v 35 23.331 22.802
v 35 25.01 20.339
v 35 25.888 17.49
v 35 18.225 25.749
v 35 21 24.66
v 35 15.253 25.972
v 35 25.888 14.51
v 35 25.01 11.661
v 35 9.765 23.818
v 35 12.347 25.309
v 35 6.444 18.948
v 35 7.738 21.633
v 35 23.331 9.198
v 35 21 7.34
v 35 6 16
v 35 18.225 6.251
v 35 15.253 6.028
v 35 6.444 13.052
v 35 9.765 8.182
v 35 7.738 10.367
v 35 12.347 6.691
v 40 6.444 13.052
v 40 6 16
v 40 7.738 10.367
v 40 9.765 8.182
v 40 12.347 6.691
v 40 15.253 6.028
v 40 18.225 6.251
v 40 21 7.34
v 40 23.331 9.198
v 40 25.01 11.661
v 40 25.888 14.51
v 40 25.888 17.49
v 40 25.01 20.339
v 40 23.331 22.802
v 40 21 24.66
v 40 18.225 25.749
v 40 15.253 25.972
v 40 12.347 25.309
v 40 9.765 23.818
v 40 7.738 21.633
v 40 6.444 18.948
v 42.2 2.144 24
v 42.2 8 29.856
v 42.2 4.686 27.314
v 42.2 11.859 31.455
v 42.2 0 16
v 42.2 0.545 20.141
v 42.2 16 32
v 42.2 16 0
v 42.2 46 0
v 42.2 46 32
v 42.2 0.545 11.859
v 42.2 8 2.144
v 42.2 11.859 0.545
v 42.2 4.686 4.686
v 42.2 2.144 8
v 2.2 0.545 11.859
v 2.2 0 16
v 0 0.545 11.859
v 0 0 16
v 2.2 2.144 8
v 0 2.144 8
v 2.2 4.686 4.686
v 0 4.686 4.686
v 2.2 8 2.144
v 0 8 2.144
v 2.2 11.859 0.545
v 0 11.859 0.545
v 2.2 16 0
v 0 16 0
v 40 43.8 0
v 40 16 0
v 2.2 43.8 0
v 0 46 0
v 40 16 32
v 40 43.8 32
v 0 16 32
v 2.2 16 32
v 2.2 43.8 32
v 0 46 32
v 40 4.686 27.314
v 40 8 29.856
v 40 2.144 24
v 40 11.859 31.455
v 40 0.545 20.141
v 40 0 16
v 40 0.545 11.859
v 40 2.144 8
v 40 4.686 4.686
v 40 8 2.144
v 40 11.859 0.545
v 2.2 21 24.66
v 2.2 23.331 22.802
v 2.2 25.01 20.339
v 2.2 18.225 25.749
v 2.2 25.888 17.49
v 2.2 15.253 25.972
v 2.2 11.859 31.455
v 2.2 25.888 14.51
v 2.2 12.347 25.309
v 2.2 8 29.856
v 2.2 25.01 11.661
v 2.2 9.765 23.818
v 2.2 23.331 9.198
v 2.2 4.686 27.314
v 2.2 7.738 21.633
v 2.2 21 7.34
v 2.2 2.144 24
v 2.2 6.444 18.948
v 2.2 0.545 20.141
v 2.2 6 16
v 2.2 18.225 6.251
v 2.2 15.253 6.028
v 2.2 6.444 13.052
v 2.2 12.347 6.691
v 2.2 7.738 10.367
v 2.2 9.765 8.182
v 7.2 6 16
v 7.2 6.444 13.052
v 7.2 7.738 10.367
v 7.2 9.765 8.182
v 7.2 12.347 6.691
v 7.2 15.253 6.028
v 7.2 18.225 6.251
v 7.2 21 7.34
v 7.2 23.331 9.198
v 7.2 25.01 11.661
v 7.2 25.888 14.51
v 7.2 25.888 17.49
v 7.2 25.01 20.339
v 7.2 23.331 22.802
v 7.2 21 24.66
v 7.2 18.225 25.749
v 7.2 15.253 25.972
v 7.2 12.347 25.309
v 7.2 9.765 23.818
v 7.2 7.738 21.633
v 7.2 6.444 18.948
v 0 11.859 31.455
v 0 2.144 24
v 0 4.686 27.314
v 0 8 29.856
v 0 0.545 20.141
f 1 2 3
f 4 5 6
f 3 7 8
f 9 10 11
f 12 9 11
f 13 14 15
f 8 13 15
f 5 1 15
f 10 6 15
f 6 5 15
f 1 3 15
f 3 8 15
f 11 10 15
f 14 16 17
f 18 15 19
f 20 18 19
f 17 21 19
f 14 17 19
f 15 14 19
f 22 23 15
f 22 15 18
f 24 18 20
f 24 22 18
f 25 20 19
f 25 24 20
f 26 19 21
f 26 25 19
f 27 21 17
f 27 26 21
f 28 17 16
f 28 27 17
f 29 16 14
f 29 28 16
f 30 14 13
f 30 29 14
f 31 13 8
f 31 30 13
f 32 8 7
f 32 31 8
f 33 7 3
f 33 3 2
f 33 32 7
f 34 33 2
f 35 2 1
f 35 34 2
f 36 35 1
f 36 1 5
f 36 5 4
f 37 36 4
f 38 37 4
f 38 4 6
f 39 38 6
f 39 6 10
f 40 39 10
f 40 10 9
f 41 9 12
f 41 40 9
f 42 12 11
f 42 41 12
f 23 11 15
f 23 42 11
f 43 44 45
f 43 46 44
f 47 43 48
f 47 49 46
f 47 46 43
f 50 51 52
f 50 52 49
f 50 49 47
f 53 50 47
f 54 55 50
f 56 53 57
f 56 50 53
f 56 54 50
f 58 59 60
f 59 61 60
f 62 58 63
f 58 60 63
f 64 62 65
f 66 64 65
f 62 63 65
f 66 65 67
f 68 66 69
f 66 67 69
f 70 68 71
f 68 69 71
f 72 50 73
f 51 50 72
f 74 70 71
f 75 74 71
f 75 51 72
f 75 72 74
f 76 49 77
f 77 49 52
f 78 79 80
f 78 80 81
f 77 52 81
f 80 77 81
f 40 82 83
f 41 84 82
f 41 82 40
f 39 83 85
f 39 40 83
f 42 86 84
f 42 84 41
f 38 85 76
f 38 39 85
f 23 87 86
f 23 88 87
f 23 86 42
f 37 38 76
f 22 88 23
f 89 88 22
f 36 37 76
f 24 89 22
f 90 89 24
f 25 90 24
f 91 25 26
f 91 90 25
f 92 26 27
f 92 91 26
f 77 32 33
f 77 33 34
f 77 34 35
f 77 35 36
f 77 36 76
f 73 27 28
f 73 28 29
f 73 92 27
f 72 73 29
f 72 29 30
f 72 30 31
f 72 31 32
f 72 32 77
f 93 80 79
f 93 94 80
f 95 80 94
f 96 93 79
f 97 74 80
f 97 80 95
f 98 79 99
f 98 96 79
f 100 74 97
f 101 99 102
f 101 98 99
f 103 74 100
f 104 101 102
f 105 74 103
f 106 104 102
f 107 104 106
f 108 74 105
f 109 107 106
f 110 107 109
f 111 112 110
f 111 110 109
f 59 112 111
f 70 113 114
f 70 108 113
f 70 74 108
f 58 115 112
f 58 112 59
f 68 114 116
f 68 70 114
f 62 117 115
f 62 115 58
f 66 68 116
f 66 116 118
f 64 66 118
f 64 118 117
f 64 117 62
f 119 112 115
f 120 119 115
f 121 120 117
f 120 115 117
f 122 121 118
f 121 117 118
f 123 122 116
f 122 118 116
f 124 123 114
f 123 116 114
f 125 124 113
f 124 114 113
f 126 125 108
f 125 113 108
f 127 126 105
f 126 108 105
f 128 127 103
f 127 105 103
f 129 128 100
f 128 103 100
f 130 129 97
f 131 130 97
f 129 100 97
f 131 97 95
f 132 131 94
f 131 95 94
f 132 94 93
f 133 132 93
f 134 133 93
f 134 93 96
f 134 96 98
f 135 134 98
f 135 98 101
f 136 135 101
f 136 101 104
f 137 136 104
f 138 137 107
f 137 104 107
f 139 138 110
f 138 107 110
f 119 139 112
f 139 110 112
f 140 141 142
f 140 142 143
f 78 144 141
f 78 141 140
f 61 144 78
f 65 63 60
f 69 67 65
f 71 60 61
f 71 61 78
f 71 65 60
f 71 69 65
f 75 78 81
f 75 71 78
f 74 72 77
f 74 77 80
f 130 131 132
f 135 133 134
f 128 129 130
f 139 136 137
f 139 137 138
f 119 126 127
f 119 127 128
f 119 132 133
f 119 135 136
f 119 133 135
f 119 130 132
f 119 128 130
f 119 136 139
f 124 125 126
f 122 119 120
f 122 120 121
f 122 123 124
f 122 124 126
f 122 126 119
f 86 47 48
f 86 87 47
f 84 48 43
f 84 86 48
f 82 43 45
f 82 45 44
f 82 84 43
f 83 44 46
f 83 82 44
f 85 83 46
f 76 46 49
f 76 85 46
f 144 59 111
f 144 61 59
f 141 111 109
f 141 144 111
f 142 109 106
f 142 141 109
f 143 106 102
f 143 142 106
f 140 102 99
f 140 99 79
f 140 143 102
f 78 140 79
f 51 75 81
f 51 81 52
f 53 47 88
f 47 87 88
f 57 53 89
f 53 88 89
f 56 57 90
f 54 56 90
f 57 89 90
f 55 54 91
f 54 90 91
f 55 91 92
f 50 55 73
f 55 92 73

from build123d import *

# Parameters (mm, degrees)
BOSS_EXTRUDE1_DEPTH = 32
FILLET1_R           = 16
SKETCH4_R           = 10
BOSS_EXTRUDE4_DEPTH = 5


with BuildPart() as part:
    # Sketch1 → Boss-Extrude1 (new body)
    with BuildSketch(Plane.XY):
        Polygon((0, 0), (0, 46), (42.2, 46), (42.2, 0), (40, 0), (40, 43.8), (2.2, 43.8), (2.2, 0), align=None)
    extrude(amount=BOSS_EXTRUDE1_DEPTH)

    # Fillet1
    fillet1_edges = [part.edges().sort_by_distance(p)[0] for p in [
        (41.1, 0, 32),
        (41.1, 0, 0),
        (1.1, 0, 0),
        (1.1, 0, 32),
    ]]
    fillet(fillet1_edges, radius=FILLET1_R - 0.0001)  # a hair under: the kernel refuses the full size

    # Sketch4 → Boss-Extrude4 (add)
    with BuildSketch(Plane(origin=(2.2, 0, 0), x_dir=(0, 0, -1), z_dir=(1, 0, 0))):
        with Locations(Location((-16, 16, 0), (0, 0, 270))):
            Circle(SKETCH4_R)
    boss_extrude4 = extrude(amount=BOSS_EXTRUDE4_DEPTH)

    # Mirror1: Boss-Extrude4 across plane
    add(boss_extrude4.mirror(Plane(origin=(21.1, 0, 0), x_dir=(0, 0, 1), z_dir=(1, 0, 0))))


solid = part.part
